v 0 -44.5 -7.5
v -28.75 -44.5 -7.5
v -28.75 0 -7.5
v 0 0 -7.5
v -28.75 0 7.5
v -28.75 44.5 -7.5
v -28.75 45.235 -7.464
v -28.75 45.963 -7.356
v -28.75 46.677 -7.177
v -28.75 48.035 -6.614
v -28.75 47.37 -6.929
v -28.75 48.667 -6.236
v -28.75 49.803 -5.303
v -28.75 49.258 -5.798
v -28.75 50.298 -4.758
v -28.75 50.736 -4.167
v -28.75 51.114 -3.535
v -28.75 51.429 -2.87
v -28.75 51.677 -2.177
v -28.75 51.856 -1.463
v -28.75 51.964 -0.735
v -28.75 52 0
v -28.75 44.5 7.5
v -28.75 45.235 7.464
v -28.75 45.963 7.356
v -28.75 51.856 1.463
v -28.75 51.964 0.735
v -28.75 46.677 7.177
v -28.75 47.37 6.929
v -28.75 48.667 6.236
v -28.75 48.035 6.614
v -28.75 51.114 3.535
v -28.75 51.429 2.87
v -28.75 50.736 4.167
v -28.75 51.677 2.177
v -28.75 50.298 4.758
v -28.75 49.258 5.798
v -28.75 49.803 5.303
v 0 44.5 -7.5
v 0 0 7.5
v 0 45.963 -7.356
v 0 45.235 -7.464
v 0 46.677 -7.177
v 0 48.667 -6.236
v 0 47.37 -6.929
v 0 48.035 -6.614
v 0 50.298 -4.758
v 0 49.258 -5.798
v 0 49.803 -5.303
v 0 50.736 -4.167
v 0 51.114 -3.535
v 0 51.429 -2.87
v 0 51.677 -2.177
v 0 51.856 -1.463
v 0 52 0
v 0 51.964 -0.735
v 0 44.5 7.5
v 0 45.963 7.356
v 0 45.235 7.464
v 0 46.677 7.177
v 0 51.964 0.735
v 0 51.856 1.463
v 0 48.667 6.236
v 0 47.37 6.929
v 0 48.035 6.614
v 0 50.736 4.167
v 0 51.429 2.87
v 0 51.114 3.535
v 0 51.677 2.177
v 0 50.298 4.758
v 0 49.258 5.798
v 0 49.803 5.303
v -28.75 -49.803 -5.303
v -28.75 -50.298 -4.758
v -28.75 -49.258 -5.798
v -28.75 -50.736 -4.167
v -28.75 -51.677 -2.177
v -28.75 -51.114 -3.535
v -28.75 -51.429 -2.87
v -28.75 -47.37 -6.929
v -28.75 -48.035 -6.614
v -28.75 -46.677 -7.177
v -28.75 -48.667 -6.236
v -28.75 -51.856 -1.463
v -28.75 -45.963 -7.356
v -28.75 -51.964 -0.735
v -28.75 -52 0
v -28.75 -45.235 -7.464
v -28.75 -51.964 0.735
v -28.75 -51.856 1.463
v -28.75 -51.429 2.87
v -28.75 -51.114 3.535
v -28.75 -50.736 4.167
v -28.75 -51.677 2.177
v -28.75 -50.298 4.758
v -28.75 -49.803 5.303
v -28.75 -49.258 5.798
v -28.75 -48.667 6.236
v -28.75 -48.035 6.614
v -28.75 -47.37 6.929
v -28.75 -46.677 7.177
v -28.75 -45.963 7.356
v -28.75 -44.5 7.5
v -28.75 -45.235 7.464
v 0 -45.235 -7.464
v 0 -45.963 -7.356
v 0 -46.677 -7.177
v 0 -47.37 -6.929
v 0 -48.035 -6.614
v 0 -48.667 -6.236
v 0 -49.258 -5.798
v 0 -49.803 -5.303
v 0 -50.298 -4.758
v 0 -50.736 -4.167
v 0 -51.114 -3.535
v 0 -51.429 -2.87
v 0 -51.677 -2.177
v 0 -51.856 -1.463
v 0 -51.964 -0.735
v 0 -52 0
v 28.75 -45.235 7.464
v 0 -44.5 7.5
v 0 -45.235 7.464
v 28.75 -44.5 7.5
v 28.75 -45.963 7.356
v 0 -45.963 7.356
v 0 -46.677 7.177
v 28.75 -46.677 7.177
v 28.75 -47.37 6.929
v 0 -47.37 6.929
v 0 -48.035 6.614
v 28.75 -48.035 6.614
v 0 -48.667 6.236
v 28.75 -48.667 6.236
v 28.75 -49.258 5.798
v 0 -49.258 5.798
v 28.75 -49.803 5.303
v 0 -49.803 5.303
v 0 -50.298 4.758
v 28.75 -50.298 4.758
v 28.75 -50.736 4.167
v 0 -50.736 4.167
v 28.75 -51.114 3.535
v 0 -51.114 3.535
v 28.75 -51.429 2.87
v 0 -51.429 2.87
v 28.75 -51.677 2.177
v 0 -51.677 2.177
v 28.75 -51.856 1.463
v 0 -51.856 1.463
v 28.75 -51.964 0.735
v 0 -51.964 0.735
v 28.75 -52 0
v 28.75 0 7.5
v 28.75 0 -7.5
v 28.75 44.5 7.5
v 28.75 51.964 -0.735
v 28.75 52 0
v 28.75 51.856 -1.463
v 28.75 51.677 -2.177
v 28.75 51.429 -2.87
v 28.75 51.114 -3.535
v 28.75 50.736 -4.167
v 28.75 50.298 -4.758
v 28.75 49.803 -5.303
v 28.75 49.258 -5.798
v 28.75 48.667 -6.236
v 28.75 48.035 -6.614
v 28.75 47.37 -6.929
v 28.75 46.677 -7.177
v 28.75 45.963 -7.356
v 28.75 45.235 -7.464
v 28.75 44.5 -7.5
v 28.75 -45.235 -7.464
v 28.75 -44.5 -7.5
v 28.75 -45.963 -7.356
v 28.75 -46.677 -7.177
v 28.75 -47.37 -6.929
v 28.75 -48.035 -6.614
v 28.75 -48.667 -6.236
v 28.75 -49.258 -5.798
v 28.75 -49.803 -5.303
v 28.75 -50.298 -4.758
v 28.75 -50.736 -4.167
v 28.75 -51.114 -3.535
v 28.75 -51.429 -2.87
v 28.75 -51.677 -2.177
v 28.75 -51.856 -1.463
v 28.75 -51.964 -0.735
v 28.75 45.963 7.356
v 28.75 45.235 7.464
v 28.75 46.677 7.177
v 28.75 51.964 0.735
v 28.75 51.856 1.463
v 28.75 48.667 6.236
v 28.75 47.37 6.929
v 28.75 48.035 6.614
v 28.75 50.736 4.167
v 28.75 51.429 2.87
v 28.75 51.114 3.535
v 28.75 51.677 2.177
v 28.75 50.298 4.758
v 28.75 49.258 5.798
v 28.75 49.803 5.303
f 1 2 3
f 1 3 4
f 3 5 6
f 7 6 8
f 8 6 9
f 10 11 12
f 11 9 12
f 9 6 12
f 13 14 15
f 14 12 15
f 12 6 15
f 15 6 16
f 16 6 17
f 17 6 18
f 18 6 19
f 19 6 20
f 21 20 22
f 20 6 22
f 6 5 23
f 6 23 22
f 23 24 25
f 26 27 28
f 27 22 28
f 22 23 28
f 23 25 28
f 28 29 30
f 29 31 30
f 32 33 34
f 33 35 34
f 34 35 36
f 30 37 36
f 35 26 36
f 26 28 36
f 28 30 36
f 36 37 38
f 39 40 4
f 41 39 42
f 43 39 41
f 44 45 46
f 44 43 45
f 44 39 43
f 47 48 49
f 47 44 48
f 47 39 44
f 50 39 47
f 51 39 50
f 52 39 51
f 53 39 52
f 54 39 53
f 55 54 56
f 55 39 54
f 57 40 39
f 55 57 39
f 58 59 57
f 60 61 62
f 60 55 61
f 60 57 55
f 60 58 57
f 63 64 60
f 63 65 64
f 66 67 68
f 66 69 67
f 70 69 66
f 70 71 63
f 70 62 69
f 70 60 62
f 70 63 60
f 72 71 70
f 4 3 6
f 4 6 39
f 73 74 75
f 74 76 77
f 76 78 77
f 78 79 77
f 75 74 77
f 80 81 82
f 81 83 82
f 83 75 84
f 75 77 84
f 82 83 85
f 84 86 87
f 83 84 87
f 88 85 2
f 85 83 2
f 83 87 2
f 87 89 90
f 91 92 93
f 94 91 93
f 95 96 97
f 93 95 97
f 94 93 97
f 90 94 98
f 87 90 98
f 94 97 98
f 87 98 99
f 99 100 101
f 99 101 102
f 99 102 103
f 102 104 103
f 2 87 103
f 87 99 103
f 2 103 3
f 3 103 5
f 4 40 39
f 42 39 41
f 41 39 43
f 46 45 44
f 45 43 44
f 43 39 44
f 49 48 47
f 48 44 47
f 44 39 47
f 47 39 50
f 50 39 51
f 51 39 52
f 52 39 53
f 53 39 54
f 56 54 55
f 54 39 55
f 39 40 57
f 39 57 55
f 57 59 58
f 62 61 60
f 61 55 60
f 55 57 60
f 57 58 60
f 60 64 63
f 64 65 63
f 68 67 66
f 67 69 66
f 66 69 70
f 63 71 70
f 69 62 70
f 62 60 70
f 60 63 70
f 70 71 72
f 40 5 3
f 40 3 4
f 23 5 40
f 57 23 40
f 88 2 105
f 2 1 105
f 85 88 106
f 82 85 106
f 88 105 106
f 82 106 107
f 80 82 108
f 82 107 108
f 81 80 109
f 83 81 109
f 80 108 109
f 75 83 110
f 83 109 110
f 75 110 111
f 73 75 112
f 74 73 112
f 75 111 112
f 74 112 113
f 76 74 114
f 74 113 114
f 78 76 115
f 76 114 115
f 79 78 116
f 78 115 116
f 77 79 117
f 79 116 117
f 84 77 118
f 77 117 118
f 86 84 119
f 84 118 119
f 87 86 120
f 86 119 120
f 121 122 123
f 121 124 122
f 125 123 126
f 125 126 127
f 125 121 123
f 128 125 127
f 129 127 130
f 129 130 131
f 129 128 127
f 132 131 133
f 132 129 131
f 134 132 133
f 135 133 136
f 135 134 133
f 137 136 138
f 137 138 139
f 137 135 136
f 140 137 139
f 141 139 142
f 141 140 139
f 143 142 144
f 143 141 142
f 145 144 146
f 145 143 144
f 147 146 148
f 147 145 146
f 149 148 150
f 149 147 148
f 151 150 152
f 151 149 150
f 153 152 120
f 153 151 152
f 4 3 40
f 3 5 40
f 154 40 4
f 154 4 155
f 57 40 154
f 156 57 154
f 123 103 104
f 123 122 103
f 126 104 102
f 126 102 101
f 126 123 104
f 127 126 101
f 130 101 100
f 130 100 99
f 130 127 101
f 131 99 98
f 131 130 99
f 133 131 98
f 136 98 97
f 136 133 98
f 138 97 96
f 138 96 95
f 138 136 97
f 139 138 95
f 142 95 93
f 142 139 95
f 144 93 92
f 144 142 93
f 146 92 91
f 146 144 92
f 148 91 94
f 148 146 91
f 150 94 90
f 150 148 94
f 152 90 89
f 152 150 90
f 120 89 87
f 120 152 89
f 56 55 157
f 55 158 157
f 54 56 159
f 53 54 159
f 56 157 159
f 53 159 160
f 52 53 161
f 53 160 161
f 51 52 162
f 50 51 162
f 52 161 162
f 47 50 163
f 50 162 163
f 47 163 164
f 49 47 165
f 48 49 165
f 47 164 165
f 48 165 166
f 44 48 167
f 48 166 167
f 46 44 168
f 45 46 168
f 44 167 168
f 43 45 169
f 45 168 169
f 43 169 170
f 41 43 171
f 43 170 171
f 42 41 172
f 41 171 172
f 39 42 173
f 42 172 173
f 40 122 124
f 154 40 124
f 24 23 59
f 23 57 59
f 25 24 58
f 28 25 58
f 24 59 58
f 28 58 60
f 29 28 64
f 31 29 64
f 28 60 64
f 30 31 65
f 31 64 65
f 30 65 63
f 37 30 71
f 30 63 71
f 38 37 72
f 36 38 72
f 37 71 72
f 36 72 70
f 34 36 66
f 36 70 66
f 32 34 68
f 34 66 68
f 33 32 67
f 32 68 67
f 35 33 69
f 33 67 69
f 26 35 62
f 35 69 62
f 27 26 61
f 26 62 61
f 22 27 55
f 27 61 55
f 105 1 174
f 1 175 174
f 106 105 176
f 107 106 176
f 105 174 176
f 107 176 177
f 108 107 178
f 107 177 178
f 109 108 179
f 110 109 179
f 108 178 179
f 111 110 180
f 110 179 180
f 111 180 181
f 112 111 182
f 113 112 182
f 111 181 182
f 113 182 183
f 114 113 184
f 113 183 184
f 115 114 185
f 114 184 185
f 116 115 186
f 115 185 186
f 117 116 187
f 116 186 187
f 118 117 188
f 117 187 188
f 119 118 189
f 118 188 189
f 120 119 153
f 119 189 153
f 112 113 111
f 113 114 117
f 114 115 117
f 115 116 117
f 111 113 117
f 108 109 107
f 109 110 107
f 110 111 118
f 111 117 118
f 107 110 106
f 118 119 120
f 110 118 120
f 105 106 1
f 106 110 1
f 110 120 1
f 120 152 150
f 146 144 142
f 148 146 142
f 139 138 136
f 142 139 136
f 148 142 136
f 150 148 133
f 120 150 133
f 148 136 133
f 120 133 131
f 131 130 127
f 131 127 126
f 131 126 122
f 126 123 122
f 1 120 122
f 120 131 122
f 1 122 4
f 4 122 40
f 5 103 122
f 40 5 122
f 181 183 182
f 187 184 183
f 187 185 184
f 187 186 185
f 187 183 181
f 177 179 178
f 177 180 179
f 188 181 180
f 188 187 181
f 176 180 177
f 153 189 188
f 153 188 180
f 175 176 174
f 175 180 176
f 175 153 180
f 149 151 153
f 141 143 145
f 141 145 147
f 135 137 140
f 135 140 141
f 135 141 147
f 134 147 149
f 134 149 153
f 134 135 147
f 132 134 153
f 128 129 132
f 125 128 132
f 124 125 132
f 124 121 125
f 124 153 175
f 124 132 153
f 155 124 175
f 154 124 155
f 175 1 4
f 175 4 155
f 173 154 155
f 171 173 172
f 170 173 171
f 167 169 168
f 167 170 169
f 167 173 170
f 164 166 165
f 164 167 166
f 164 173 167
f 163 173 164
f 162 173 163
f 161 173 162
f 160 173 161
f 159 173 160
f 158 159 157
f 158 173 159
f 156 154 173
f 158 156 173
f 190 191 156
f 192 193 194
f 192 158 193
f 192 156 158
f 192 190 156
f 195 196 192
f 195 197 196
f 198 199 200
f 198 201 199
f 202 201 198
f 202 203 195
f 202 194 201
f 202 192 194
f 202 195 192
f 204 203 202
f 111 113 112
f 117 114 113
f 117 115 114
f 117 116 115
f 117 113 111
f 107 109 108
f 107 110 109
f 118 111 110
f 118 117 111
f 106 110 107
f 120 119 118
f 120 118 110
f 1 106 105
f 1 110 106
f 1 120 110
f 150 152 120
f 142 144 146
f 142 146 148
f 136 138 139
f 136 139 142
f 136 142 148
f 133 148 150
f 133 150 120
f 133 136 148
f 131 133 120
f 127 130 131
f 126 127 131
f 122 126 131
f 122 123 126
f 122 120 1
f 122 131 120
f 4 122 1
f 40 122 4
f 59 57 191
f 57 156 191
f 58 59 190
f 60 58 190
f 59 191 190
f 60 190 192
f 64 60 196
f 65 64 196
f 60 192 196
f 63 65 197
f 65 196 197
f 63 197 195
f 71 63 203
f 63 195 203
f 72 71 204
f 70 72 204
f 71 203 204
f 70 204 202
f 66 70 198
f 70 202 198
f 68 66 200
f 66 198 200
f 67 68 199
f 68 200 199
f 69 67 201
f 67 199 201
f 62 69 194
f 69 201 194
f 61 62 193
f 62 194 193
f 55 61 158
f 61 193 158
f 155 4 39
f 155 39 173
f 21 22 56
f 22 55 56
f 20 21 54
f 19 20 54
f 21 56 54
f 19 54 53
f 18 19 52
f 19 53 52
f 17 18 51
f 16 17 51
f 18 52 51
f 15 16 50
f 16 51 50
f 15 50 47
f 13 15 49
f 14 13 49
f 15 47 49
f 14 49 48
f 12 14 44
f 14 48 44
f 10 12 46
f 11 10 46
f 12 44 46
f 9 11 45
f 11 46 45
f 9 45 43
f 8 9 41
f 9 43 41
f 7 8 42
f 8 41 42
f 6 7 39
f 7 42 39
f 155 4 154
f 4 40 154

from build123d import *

# Parameters (mm, degrees)
F0_W     = 28.75
F0_H     = 52
F1_DEPTH = 7.5
F2_DEPTH = 7.5
F3_R     = 7.49999
F3_2_R   = 7.49999
F3_3_R   = 7.49999
F3_4_R   = 7.49999


# Not quite as in the source:
# - a fillet or chamfer is up to 0.001 mm smaller than in the source, because OpenCascade refuses the exact size


with BuildPart() as f1:
    # F0 (on Top) → F1 (new body, symmetric)
    with BuildSketch(Plane.XY):
        with Locations((-14.375, 26)):
            Rectangle(F0_W, F0_H)
    extrude(amount=F1_DEPTH, both=True)

    # F3 (radius 7.5 in the source; OpenCascade refuses exactly that, so slightly less here)
    f3_edges = [f1.edges().sort_by_distance(p)[0] for p in [
        (-14.375, 52, 7.5),
        (-14.375, 52, -7.5),
    ]]
    fillet(f3_edges, radius=F3_R)


with BuildPart() as f1b:
    # F0 (on Top) → F1, piece 2 (new body, symmetric)
    with BuildSketch(Plane.XY):
        with Locations((14.375, -26)):
            Rectangle(F0_W, F0_H)
    extrude(amount=F1_DEPTH, both=True)

    # F3#3 (radius 7.5 in the source; OpenCascade refuses exactly that, so slightly less here)
    f3_3_edges = [f1b.edges().sort_by_distance(p)[0] for p in [
        (14.375, -52, 7.5),
        (14.375, -52, -7.5),
    ]]
    fillet(f3_3_edges, radius=F3_3_R)


with BuildPart() as f2:
    # F0 (on Top) → F2 (new body, symmetric)
    with BuildSketch(Plane.XY):
        with Locations((14.375, 26)):
            Rectangle(F0_W, F0_H)
    extrude(amount=F2_DEPTH, both=True)

    # F3#2 (radius 7.5 in the source; OpenCascade refuses exactly that, so slightly less here)
    f3_2_edges = [f2.edges().sort_by_distance(p)[0] for p in [
        (14.375, 52, 7.5),
        (14.375, 52, -7.5),
    ]]
    fillet(f3_2_edges, radius=F3_2_R)


with BuildPart() as f2b:
    # F0 (on Top) → F2, piece 2 (new body, symmetric)
    with BuildSketch(Plane.XY):
        with Locations((-14.375, -26)):
            Rectangle(F0_W, F0_H)
    extrude(amount=F2_DEPTH, both=True)

    # F3#4 (radius 7.5 in the source; OpenCascade refuses exactly that, so slightly less here)
    f3_4_edges = [f2b.edges().sort_by_distance(p)[0] for p in [
        (-14.375, -52, 7.5),
        (-14.375, -52, -7.5),
    ]]
    fillet(f3_4_edges, radius=F3_4_R)


solid = Compound([f1.part, f1b.part, f2.part, f2b.part])
